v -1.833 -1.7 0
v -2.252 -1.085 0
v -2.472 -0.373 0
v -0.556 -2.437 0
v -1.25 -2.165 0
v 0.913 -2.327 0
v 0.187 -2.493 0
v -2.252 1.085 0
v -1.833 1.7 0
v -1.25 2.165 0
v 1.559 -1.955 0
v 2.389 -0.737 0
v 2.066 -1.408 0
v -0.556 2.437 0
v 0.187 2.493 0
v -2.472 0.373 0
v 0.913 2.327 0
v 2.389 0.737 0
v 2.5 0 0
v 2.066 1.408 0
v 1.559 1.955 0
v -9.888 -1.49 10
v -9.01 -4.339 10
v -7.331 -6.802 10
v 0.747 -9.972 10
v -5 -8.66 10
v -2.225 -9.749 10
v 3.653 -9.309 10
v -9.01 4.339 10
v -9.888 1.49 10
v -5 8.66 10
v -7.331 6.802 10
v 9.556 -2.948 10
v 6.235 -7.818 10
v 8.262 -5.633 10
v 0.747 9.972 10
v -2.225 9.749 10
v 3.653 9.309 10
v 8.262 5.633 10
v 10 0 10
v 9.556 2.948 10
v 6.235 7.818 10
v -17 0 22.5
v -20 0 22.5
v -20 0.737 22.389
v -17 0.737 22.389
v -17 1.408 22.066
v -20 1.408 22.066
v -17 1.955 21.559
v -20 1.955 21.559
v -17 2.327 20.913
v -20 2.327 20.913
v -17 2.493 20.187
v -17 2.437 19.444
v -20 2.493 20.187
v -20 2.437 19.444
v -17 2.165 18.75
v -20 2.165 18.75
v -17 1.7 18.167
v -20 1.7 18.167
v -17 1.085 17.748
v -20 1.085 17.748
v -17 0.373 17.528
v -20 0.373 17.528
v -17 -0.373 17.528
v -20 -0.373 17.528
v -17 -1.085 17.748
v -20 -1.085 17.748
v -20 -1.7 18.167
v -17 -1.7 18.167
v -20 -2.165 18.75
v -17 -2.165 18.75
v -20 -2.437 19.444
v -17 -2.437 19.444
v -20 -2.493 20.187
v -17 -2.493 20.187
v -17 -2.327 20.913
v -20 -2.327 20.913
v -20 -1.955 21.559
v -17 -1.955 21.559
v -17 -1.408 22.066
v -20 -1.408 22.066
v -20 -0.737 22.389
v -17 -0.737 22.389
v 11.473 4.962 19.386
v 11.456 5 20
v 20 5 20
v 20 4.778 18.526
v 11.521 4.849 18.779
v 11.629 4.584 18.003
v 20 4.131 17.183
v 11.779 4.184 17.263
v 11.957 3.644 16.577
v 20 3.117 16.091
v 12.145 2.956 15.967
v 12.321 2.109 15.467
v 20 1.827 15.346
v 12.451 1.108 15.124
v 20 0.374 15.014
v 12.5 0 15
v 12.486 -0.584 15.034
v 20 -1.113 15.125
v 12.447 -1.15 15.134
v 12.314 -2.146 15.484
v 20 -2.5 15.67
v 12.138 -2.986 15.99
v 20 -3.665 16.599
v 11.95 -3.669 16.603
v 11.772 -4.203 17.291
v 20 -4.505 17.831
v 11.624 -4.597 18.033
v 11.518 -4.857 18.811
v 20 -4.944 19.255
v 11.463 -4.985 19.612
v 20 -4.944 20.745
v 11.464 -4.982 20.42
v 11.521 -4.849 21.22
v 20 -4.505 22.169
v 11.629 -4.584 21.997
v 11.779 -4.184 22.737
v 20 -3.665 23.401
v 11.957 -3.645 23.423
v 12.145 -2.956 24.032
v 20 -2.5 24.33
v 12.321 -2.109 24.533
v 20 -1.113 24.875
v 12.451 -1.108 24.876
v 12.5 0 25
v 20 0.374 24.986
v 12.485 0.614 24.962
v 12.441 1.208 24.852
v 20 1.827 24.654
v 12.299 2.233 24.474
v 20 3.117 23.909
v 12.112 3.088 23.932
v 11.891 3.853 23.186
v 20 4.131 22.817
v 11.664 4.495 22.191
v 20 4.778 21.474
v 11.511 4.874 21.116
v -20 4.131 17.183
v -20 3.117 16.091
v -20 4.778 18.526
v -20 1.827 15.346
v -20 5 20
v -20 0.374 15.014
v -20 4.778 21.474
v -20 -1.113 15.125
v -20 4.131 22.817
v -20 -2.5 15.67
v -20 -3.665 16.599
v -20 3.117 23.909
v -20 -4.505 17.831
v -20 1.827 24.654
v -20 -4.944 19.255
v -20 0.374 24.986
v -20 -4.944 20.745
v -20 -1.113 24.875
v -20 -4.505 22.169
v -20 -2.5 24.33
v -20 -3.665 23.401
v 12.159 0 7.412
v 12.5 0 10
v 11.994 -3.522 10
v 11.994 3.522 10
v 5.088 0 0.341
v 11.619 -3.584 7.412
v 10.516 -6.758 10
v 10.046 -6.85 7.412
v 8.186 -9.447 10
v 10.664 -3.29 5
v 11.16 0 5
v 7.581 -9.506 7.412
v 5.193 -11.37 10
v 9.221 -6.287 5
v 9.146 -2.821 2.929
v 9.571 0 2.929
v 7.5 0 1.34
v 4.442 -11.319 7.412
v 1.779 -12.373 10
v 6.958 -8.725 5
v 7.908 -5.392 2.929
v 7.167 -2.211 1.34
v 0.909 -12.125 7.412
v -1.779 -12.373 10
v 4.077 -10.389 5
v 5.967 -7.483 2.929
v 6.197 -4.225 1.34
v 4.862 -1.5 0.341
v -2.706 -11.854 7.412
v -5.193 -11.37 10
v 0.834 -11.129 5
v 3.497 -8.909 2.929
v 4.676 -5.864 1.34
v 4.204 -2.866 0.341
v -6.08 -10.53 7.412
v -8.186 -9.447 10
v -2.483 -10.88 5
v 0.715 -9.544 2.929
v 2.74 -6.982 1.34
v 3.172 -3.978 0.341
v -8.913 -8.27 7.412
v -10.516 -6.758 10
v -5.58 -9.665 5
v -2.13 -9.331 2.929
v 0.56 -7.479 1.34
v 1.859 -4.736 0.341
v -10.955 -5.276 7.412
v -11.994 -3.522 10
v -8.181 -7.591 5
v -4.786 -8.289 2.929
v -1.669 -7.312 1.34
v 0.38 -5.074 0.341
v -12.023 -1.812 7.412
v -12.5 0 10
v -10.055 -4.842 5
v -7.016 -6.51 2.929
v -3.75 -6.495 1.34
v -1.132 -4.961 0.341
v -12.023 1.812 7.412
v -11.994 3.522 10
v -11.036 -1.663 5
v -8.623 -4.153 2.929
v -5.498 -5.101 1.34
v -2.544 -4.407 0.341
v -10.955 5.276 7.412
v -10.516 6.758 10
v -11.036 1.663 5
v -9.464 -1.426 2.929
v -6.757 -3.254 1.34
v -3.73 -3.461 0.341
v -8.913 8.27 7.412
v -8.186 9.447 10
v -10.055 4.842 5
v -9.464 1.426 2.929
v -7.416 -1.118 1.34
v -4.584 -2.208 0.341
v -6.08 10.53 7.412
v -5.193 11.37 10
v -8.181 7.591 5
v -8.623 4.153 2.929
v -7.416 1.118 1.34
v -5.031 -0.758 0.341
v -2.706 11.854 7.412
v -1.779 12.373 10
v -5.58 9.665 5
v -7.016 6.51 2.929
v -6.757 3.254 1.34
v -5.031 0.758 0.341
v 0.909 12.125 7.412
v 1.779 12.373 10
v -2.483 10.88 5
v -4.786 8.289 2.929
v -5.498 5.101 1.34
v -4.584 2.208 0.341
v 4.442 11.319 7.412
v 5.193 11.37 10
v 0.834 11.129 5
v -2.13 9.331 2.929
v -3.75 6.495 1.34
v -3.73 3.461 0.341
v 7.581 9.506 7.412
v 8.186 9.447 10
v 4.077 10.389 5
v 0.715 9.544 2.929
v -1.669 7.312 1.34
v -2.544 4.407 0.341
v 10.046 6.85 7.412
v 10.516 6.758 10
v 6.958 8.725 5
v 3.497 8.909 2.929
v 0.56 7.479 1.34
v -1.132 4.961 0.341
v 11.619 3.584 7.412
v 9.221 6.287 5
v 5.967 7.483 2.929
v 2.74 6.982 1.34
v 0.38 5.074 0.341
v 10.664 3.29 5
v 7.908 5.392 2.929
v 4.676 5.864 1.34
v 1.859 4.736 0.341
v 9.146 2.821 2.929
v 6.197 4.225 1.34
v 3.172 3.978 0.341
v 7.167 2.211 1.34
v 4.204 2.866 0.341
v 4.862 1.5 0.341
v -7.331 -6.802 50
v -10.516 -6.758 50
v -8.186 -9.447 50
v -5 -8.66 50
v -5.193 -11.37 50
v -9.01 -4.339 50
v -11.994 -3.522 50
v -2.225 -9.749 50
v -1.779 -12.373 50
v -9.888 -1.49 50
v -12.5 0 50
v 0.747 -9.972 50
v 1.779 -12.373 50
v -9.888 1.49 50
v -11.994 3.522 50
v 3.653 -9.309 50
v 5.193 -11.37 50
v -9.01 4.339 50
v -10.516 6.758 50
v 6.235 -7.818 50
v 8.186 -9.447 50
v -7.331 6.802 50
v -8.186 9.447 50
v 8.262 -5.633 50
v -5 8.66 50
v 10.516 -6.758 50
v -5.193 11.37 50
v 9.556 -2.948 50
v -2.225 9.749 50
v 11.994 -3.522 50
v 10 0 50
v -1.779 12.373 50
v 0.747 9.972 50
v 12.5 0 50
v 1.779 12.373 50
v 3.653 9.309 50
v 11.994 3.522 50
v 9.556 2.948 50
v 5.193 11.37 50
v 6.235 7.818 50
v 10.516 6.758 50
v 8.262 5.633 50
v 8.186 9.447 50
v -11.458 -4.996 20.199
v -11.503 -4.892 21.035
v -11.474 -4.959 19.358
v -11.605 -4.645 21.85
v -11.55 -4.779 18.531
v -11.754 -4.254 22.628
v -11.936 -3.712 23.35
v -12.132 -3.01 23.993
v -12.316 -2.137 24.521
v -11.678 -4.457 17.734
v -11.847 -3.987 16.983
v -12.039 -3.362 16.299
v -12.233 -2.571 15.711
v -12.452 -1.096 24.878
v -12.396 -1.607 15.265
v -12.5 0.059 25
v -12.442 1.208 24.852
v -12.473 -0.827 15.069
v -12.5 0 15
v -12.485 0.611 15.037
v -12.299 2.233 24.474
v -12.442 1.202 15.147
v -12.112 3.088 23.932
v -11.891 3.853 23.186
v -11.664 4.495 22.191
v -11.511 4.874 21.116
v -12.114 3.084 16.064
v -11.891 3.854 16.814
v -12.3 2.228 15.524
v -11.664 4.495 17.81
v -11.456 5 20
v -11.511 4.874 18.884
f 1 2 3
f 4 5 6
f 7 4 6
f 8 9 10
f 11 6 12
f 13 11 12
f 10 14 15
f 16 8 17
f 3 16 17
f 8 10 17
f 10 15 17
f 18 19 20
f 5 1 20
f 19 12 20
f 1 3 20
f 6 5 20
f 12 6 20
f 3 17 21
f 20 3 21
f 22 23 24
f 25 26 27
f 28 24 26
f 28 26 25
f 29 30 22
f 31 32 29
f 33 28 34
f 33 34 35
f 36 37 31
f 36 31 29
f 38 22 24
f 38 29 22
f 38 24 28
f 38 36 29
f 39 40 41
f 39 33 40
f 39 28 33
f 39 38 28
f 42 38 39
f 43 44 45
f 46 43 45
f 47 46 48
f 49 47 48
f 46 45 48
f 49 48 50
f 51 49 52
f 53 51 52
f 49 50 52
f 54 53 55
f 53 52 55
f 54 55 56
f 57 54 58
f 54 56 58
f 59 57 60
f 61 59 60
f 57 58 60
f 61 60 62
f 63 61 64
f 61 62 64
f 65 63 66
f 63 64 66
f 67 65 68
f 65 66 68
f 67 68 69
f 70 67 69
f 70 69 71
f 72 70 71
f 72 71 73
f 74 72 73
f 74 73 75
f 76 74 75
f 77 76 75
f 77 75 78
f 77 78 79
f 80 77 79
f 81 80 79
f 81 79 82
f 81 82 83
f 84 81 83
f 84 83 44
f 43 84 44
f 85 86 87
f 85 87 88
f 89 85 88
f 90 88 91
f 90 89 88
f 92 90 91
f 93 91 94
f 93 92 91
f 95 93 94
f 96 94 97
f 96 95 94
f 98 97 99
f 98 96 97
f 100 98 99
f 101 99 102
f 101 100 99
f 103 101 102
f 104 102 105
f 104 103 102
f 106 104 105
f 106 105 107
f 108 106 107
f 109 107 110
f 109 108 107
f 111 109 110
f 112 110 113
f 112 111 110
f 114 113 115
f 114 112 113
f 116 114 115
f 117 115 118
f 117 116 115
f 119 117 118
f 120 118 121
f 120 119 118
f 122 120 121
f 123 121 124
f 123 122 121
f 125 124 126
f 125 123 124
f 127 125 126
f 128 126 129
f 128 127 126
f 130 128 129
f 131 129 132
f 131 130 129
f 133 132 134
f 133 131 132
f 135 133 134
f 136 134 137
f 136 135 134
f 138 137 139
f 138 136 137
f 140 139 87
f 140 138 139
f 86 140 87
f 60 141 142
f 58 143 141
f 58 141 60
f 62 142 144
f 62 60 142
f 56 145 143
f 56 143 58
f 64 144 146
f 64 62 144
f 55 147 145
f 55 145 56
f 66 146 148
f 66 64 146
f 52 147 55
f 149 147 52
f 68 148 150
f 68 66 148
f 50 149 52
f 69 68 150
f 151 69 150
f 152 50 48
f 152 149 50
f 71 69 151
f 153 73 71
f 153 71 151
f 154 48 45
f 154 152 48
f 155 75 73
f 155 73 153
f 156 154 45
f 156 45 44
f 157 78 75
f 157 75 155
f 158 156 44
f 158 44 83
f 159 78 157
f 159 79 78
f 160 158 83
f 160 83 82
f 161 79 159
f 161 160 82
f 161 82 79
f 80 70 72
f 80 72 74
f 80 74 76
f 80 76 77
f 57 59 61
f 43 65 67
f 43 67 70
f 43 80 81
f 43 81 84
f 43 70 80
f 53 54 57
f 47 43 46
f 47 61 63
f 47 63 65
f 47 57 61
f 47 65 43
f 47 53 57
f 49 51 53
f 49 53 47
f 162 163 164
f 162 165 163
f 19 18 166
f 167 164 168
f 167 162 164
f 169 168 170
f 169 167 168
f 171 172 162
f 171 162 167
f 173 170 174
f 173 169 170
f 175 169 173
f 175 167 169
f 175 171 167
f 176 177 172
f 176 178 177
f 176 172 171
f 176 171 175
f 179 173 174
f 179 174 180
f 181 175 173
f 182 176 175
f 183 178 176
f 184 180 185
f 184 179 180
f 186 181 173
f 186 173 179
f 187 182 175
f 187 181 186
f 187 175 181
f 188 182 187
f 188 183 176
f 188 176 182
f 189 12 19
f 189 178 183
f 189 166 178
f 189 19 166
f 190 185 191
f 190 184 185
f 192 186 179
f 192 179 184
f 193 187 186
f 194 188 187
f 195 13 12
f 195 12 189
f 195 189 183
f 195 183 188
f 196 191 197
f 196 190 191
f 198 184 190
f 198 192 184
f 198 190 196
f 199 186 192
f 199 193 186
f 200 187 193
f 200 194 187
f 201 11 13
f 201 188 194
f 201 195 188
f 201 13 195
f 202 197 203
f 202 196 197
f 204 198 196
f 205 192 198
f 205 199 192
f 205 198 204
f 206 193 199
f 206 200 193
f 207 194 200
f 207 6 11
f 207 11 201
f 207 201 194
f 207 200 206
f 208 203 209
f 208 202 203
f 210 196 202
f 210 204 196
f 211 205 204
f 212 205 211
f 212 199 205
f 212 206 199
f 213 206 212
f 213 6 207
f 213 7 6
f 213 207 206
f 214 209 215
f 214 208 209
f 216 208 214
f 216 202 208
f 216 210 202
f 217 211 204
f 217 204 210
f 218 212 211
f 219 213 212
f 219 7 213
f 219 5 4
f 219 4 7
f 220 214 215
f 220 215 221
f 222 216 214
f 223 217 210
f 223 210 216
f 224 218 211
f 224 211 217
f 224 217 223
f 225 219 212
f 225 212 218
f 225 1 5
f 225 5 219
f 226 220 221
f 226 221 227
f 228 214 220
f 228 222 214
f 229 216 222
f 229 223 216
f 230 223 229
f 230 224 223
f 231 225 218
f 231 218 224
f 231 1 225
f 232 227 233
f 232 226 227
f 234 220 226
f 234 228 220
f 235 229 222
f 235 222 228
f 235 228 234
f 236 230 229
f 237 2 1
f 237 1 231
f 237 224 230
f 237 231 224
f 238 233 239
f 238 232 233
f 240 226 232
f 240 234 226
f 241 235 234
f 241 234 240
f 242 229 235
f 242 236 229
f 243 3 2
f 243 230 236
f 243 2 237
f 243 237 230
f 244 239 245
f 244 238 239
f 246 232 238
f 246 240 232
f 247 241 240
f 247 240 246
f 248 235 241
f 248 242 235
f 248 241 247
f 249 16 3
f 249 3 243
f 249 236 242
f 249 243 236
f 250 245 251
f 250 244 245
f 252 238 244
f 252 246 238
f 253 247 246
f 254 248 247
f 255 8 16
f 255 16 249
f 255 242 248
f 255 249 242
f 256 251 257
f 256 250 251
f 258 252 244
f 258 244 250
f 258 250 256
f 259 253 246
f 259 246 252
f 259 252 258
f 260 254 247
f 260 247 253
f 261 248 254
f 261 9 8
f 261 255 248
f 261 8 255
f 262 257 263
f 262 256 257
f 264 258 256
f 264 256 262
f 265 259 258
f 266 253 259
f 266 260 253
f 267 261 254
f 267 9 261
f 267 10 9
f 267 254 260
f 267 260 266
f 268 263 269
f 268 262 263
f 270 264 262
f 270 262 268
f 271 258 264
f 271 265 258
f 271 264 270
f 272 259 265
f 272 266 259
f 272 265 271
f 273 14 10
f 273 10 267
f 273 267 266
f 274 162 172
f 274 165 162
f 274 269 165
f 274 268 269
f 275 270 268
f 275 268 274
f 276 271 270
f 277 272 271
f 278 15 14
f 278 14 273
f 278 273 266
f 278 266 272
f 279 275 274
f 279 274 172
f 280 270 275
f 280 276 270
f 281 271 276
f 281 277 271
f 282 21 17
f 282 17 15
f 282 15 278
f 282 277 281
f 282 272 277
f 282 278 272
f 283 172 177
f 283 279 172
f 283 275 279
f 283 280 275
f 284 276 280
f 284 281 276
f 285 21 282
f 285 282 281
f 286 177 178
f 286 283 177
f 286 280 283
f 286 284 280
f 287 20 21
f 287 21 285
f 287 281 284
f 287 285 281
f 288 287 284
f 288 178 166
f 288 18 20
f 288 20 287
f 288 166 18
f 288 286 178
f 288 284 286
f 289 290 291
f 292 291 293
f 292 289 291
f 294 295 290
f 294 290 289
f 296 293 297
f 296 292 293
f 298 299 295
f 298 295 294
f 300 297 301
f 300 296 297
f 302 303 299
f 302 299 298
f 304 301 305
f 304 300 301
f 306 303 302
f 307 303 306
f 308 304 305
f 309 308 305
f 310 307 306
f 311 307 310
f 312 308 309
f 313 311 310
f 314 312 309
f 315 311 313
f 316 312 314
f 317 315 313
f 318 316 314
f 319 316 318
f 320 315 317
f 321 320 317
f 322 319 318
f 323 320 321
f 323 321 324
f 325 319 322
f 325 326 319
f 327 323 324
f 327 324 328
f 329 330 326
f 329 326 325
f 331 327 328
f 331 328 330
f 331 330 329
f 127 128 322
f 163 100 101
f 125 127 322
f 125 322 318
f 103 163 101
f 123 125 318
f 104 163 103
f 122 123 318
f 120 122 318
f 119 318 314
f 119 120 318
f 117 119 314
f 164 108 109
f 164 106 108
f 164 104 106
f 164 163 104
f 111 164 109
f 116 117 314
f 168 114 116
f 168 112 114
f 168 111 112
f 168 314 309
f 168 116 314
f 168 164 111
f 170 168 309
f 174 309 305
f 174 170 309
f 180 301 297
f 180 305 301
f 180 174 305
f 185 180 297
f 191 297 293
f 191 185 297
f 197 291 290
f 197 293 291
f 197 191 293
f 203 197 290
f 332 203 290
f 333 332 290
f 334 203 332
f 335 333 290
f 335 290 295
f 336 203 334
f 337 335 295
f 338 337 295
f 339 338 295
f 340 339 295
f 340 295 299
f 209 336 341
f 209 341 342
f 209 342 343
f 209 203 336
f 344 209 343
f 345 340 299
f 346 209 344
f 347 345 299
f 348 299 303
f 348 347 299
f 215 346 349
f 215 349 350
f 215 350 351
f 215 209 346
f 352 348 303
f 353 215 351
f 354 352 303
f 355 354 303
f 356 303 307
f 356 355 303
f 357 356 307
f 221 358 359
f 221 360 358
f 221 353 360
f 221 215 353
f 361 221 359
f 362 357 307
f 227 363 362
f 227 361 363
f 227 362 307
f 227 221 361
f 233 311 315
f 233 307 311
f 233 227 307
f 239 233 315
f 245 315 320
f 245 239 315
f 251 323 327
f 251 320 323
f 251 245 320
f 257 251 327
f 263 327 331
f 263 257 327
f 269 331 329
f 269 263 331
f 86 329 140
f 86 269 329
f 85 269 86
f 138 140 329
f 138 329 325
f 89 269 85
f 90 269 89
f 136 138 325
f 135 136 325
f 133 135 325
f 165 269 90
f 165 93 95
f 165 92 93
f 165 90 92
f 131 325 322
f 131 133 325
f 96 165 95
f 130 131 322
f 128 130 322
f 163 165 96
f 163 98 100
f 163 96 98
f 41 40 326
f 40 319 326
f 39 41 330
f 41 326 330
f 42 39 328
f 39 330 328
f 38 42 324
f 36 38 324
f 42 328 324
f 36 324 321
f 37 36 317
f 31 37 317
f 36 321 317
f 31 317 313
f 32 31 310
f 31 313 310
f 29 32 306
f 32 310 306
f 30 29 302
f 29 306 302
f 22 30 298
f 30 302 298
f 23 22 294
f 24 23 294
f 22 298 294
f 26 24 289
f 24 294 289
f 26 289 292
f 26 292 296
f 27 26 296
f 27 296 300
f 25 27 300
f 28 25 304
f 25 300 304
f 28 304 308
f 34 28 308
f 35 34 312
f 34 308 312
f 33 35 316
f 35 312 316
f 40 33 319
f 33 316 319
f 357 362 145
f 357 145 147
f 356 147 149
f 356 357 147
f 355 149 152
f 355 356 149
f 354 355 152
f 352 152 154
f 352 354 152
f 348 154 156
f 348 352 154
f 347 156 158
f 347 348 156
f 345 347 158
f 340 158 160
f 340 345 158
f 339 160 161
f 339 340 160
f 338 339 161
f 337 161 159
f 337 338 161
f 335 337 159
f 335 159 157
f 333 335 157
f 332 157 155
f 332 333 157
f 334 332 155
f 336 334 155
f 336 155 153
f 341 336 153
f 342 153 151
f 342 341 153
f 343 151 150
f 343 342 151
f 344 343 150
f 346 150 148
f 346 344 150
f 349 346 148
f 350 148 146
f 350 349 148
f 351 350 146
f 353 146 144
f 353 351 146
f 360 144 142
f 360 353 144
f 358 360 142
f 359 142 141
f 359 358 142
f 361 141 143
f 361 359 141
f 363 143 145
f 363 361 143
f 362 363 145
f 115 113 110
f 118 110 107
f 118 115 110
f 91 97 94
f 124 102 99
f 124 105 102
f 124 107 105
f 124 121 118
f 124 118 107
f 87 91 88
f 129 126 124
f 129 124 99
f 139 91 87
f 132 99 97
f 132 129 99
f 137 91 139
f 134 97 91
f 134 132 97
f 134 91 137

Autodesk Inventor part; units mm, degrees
sketch "Sketch19" plane through (0, 0, 0) normal (0, 0, 1) x (1, 0, 0)
  circle A0 centre (0, 0) radius 12.5
  dimension "d130" = 25
extrude "Extrusion17" add sketch "Sketch19" along normal blind 50
sketch "Sketch20" plane through (0, 0, 50) normal (0, 0, 1) x (1, 0, 0)
  circle A0 centre (0, 0) radius 10
  dimension "d133" = 20
fillet "Fillet6" radius 10 1 edges at (-12.5, 0, 0)
extrude "Extrusion18" cut sketch "Sketch20" against normal blind 40
ref_plane "Work Plane3" through (10, 0, 0) normal (1, 0, 0) x (0, 1, 0)
sketch "Sketch21" plane through (10, 0, 0) normal (1, 0, 0) x (0, 1, 0)
  line L0 (0, 0) -> (0, 20)
  circle A0 centre (0, 20) radius 5
  dimension "d138" = 20
  dimension "d139" = 10
extrude "Extrusion19" add sketch "Sketch21" along normal blind 10
mirror "Mirror1" about plane through (0, 0, 0) normal (1, 0, 0) of "Extrusion19"
sketch "Sketch22" plane through (-20, 0, 20) normal (-1, 0, 0) x (0, 0, 1)
  circle A0 centre (0, 0) radius 2.5
  point P0 (-20, 0)
  dimension "d142" = 5
extrude "Extrusion20" cut sketch "Sketch22" against normal blind 3
properties part number "Waterkanon" material "S235"
